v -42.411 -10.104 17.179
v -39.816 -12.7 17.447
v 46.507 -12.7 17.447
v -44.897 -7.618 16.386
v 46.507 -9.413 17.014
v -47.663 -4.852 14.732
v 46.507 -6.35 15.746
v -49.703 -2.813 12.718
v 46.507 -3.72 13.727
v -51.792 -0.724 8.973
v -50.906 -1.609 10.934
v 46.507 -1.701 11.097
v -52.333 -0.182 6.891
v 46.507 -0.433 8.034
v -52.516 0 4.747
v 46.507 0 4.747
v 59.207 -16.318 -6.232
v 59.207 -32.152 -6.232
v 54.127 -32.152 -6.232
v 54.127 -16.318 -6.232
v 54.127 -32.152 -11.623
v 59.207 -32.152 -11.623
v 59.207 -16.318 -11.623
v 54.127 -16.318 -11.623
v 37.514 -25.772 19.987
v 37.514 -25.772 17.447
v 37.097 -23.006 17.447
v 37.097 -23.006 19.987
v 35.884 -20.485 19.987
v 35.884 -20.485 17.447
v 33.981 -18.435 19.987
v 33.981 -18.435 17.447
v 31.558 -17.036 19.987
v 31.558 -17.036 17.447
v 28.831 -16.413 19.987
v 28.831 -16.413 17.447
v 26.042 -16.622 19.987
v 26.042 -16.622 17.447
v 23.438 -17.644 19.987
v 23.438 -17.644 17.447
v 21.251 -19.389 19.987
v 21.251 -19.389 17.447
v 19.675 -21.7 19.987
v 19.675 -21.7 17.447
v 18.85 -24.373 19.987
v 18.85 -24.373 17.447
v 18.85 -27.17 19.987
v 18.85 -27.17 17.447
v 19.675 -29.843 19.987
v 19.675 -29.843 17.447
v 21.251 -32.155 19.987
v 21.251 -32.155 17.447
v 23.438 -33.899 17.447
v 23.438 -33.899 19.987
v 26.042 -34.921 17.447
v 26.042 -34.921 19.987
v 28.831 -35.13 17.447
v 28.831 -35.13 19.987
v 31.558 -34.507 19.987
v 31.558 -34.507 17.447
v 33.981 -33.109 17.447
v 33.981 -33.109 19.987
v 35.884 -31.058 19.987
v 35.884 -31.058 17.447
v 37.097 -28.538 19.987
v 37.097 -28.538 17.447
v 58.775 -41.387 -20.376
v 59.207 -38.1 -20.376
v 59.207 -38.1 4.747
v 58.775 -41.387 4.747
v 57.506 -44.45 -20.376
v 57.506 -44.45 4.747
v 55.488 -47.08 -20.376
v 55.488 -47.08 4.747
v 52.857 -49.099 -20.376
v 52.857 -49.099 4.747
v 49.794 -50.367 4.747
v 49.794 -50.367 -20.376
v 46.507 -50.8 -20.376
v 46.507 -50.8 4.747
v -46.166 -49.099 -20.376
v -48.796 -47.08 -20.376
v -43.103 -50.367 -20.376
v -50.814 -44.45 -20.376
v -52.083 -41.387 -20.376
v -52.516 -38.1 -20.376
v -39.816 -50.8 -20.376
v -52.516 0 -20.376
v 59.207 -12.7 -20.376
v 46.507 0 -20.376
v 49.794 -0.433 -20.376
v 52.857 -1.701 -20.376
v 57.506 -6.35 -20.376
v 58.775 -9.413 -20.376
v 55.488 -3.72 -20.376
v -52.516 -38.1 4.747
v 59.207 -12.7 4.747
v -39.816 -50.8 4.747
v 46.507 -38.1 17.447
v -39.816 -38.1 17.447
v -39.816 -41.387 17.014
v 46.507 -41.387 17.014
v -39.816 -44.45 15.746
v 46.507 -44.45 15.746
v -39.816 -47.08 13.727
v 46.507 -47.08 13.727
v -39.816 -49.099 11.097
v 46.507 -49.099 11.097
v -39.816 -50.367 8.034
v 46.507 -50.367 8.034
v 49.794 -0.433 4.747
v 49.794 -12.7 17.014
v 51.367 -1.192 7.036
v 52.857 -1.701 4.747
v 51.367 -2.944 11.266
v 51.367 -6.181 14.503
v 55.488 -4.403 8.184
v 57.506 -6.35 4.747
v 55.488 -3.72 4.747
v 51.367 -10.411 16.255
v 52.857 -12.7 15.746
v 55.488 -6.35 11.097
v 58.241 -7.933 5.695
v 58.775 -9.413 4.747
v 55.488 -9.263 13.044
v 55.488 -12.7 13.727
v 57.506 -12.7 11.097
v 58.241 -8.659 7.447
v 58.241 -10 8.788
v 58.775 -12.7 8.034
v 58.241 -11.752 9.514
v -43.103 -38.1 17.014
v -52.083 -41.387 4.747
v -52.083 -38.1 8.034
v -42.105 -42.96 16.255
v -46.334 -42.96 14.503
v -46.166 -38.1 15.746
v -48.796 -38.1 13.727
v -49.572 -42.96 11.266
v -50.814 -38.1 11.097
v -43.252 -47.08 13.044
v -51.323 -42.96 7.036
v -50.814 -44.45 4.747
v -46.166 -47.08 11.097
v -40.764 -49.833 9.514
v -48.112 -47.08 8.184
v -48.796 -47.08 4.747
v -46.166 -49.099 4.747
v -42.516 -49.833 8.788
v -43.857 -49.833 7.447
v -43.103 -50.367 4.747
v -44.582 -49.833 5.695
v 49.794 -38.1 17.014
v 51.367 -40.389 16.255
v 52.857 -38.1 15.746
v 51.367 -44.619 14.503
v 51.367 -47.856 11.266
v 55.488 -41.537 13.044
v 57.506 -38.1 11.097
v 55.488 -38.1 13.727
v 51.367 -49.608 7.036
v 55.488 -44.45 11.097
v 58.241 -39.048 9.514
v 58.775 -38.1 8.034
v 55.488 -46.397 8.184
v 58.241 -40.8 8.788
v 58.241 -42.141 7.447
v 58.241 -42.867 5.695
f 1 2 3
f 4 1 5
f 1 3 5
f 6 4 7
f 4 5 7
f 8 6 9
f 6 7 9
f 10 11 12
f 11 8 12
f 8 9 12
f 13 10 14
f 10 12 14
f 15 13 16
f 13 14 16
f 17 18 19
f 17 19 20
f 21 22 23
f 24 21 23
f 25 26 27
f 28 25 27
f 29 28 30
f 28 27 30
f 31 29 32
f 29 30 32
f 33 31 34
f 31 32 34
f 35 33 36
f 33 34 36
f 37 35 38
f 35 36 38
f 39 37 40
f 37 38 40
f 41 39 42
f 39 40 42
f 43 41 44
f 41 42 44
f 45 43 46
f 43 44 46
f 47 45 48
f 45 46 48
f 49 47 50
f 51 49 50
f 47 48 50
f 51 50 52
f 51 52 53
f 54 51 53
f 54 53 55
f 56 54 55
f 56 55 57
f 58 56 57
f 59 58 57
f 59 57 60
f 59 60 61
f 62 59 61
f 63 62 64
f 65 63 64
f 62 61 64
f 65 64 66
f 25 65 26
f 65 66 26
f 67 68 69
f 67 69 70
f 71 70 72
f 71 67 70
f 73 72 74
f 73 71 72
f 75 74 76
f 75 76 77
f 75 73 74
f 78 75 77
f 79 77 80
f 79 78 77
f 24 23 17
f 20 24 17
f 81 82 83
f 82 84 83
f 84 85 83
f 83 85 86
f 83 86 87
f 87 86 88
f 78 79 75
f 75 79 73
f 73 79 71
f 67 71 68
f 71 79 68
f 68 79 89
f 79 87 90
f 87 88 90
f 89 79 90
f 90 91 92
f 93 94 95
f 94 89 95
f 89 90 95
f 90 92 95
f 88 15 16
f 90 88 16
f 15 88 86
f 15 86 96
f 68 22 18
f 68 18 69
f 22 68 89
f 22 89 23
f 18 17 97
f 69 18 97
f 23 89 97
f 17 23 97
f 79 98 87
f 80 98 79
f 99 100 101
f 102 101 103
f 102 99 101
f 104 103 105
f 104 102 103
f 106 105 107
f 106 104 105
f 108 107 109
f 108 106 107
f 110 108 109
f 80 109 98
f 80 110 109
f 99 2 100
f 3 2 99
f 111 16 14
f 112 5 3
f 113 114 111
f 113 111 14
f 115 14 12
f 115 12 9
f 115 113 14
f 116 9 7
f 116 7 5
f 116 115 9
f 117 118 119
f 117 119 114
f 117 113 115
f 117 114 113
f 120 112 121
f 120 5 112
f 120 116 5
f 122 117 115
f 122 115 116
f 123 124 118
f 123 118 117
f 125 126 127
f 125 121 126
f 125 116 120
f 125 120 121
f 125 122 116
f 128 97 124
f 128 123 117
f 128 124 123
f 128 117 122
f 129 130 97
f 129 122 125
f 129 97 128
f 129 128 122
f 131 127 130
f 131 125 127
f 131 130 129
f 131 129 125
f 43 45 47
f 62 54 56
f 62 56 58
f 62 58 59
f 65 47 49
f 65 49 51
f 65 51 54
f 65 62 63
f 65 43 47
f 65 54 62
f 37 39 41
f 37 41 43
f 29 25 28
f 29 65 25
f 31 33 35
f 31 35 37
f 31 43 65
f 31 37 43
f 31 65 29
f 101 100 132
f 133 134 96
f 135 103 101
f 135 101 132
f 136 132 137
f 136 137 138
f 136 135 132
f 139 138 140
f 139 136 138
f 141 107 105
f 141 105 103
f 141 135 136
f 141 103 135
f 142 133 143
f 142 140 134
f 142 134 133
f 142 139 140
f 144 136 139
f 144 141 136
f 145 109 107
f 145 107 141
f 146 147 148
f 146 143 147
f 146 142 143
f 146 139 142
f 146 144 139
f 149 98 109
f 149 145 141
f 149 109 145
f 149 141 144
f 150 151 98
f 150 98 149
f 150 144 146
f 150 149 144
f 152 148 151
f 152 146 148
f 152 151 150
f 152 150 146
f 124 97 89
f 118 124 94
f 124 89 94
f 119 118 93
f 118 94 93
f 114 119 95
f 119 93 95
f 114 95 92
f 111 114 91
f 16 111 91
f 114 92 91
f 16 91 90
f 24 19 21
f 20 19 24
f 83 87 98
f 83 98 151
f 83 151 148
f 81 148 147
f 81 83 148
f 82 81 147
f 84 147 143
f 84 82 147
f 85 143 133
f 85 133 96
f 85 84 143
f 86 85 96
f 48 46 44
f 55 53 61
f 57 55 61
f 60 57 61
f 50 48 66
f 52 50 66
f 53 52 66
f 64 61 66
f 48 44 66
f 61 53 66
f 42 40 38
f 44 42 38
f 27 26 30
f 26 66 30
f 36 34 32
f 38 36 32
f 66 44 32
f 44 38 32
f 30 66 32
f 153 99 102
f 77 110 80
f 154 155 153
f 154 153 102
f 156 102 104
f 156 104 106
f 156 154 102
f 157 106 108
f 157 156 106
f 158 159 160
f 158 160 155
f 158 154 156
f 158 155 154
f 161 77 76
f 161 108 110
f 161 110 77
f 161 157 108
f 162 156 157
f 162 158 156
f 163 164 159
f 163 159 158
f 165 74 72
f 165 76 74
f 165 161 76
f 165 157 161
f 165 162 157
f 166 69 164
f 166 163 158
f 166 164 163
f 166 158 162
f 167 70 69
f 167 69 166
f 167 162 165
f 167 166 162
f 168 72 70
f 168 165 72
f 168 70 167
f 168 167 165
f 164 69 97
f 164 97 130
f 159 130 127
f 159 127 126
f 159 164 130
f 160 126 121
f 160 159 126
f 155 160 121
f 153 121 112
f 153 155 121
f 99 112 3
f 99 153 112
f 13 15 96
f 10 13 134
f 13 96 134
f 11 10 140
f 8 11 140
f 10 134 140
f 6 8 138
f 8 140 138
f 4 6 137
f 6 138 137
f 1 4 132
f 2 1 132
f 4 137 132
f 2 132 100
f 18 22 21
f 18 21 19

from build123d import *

# Parameters (mm, degrees)
F0_W         = 111.723061651
F0_H         = 37.8229115158
F1_DEPTH     = 50.8
F2_R         = 12.7
F3_T1_DEPTH  = 56.8729115158
F3_S5_W      = 12.7
F3_S5_H      = 12.7
F3_T6_DEPTH  = 12.7
F3_S11_W     = 12.7
F3_S11_H     = 12.7
F3_T12_DEPTH = 12.7
F3_S17_W     = 12.7
F3_S17_H     = 12.7
F3_T18_DEPTH = 12.7
F4_W         = 15.8335566521
F4_H         = 5.3901481442
F5_DEPTH     = 5.08
F6_R         = 9.3845015794
F7_DEPTH     = 2.54


# Not quite as in the source:
# - a fillet or chamfer that OpenCascade refuses, or shapes differently, is made with other operations: its cross-section is extruded or revolved along the edge and cut away or added


with BuildPart() as f1:
    # F0 (on Front) → F1 (new body)
    with BuildSketch(Plane.XZ):
        with Locations((3.3458750695, -1.4644479379)):
            Rectangle(F0_W, F0_H)
    extrude(amount=F1_DEPTH)

    # F2
    f2_edges = [f1.edges().sort_by_distance(p)[0] for p in [
        (59.207406, -25.4, 17.447008),
        (-52.515656, -25.4, 17.447008),
        (3.345875, 0, 17.447008),
        (3.345875, -50.8, 17.447008),
    ]]
    fillet(f2_edges, radius=F2_R)

    # F3: fillet of radius 12.7 on 7 edges, made by hand

    # F3_s2 → F3_t1 (cut)
    with BuildSketch(Plane.XY.offset(-52.1259036958)):
        with BuildLine():
            ThreePointArc((-39.815655756, -50.8), (-48.7959118771, -47.0802561211), (-52.515655756, -38.1))
            Line((-52.515655756, -38.1), (-52.515655756, -50.8))
            Line((-52.515655756, -50.8), (-39.815655756, -50.8))
        make_face()
        with BuildLine():
            ThreePointArc((59.207405895, -38.1), (55.4876620161, -47.0802561211), (46.507405895, -50.8))
            Line((46.507405895, -50.8), (59.207405895, -50.8))
            Line((59.207405895, -50.8), (59.207405895, -38.1))
        make_face()
        with BuildLine():
            ThreePointArc((59.207405895, -12.7), (55.4876620161, -3.7197438789), (46.507405895, 0))
            Line((46.507405895, 0), (59.207405895, 0))
            Line((59.207405895, 0), (59.207405895, -12.7))
        make_face()
    extrude(amount=F3_T1_DEPTH, mode=Mode.SUBTRACT)


with BuildPart() as f3_tool4:
    # F3_s5 → F3_t6 (new body)
    with BuildSketch(Plane.YZ.offset(46.507405895)):
        with Locations((-6.35, 11.09700782)):
            Rectangle(F3_S5_W, F3_S5_H)
    extrude(amount=F3_T6_DEPTH)

    # F3_s7 → F3_t8 (revolve, cut)
    with BuildSketch(Plane(origin=(46.507405895, -12.7, 4.74700782), x_dir=(0, -0.7071067812, -0.7071067812), z_dir=(0, -0.7071067812, 0.7071067812))):
        with BuildLine():
            ThreePointArc((0, -12.7), (12.7, 0), (0, 12.7))
            Line((0, 12.7), (0, -12.7))
        make_face()
    revolve(axis=Axis((46.507405895, -12.7, 4.74700782), (1, 0, 0)), mode=Mode.SUBTRACT)


with BuildPart() as f1_1:
    add(f1.part)

    # F3_t3: cut F3_tool4
    add(f3_tool4.part, mode=Mode.SUBTRACT)


with BuildPart() as f3_tool10:
    # F3_s11 → F3_t12 (new body)
    with BuildSketch(Plane.YZ.offset(46.507405895)):
        with Locations((-44.45, 11.09700782)):
            Rectangle(F3_S11_W, F3_S11_H)
    extrude(amount=F3_T12_DEPTH)

    # F3_s13 → F3_t14 (revolve, cut)
    with BuildSketch(Plane(origin=(46.507405895, -38.1, 4.74700782), x_dir=(0, 0.7071067812, -0.7071067812), z_dir=(0, -0.7071067812, -0.7071067812))):
        with BuildLine():
            ThreePointArc((0, -12.7), (12.7, 0), (0, 12.7))
            Line((0, 12.7), (0, -12.7))
        make_face()
    revolve(axis=Axis((46.507405895, -38.1, 4.74700782), (1, 0, 0)), mode=Mode.SUBTRACT)


with BuildPart() as f1_2:
    add(f1_1.part)

    # F3_t9: cut F3_tool10
    add(f3_tool10.part, mode=Mode.SUBTRACT)


with BuildPart() as f3_tool16:
    # F3_s17 → F3_t18 (new body)
    with BuildSketch(Plane.XZ.offset(38.1)):
        with Locations((-46.165655756, 11.09700782)):
            Rectangle(F3_S17_W, F3_S17_H)
    extrude(amount=F3_T18_DEPTH)

    # F3_s19 → F3_t20 (revolve, cut)
    with BuildSketch(Plane(origin=(-39.815655756, -38.1, 4.74700782), x_dir=(0.7071067812, 0, -0.7071067812), z_dir=(-0.7071067812, 0, -0.7071067812))):
        with BuildLine():
            ThreePointArc((0, -12.7), (12.7, 0), (0, 12.7))
            Line((0, 12.7), (0, -12.7))
        make_face()
    revolve(axis=Axis((-39.815655756, -38.1, 4.74700782), (0, -1, 0)), mode=Mode.SUBTRACT)


with BuildPart() as f1_3:
    add(f1_2.part)

    # F3_t15: cut F3_tool16
    add(f3_tool16.part, mode=Mode.SUBTRACT)

    # F4 (on face) → F5 (cut)
    with BuildSketch(Plane.YZ.offset(59.207405895)):
        with Locations((-24.2352448404, -8.9274321217)):
            Rectangle(F4_W, F4_H)
    extrude(amount=-F5_DEPTH, mode=Mode.SUBTRACT)


with BuildPart() as f7:
    # F6 (on face) → F7 (new body)
    with BuildSketch(Plane.XY.offset(17.44700782)):
        with Locations((28.1298365444, -25.7716421038)):
            Circle(F6_R)
    extrude(amount=F7_DEPTH)


solid = Compound([f1_3.part, f7.part])
